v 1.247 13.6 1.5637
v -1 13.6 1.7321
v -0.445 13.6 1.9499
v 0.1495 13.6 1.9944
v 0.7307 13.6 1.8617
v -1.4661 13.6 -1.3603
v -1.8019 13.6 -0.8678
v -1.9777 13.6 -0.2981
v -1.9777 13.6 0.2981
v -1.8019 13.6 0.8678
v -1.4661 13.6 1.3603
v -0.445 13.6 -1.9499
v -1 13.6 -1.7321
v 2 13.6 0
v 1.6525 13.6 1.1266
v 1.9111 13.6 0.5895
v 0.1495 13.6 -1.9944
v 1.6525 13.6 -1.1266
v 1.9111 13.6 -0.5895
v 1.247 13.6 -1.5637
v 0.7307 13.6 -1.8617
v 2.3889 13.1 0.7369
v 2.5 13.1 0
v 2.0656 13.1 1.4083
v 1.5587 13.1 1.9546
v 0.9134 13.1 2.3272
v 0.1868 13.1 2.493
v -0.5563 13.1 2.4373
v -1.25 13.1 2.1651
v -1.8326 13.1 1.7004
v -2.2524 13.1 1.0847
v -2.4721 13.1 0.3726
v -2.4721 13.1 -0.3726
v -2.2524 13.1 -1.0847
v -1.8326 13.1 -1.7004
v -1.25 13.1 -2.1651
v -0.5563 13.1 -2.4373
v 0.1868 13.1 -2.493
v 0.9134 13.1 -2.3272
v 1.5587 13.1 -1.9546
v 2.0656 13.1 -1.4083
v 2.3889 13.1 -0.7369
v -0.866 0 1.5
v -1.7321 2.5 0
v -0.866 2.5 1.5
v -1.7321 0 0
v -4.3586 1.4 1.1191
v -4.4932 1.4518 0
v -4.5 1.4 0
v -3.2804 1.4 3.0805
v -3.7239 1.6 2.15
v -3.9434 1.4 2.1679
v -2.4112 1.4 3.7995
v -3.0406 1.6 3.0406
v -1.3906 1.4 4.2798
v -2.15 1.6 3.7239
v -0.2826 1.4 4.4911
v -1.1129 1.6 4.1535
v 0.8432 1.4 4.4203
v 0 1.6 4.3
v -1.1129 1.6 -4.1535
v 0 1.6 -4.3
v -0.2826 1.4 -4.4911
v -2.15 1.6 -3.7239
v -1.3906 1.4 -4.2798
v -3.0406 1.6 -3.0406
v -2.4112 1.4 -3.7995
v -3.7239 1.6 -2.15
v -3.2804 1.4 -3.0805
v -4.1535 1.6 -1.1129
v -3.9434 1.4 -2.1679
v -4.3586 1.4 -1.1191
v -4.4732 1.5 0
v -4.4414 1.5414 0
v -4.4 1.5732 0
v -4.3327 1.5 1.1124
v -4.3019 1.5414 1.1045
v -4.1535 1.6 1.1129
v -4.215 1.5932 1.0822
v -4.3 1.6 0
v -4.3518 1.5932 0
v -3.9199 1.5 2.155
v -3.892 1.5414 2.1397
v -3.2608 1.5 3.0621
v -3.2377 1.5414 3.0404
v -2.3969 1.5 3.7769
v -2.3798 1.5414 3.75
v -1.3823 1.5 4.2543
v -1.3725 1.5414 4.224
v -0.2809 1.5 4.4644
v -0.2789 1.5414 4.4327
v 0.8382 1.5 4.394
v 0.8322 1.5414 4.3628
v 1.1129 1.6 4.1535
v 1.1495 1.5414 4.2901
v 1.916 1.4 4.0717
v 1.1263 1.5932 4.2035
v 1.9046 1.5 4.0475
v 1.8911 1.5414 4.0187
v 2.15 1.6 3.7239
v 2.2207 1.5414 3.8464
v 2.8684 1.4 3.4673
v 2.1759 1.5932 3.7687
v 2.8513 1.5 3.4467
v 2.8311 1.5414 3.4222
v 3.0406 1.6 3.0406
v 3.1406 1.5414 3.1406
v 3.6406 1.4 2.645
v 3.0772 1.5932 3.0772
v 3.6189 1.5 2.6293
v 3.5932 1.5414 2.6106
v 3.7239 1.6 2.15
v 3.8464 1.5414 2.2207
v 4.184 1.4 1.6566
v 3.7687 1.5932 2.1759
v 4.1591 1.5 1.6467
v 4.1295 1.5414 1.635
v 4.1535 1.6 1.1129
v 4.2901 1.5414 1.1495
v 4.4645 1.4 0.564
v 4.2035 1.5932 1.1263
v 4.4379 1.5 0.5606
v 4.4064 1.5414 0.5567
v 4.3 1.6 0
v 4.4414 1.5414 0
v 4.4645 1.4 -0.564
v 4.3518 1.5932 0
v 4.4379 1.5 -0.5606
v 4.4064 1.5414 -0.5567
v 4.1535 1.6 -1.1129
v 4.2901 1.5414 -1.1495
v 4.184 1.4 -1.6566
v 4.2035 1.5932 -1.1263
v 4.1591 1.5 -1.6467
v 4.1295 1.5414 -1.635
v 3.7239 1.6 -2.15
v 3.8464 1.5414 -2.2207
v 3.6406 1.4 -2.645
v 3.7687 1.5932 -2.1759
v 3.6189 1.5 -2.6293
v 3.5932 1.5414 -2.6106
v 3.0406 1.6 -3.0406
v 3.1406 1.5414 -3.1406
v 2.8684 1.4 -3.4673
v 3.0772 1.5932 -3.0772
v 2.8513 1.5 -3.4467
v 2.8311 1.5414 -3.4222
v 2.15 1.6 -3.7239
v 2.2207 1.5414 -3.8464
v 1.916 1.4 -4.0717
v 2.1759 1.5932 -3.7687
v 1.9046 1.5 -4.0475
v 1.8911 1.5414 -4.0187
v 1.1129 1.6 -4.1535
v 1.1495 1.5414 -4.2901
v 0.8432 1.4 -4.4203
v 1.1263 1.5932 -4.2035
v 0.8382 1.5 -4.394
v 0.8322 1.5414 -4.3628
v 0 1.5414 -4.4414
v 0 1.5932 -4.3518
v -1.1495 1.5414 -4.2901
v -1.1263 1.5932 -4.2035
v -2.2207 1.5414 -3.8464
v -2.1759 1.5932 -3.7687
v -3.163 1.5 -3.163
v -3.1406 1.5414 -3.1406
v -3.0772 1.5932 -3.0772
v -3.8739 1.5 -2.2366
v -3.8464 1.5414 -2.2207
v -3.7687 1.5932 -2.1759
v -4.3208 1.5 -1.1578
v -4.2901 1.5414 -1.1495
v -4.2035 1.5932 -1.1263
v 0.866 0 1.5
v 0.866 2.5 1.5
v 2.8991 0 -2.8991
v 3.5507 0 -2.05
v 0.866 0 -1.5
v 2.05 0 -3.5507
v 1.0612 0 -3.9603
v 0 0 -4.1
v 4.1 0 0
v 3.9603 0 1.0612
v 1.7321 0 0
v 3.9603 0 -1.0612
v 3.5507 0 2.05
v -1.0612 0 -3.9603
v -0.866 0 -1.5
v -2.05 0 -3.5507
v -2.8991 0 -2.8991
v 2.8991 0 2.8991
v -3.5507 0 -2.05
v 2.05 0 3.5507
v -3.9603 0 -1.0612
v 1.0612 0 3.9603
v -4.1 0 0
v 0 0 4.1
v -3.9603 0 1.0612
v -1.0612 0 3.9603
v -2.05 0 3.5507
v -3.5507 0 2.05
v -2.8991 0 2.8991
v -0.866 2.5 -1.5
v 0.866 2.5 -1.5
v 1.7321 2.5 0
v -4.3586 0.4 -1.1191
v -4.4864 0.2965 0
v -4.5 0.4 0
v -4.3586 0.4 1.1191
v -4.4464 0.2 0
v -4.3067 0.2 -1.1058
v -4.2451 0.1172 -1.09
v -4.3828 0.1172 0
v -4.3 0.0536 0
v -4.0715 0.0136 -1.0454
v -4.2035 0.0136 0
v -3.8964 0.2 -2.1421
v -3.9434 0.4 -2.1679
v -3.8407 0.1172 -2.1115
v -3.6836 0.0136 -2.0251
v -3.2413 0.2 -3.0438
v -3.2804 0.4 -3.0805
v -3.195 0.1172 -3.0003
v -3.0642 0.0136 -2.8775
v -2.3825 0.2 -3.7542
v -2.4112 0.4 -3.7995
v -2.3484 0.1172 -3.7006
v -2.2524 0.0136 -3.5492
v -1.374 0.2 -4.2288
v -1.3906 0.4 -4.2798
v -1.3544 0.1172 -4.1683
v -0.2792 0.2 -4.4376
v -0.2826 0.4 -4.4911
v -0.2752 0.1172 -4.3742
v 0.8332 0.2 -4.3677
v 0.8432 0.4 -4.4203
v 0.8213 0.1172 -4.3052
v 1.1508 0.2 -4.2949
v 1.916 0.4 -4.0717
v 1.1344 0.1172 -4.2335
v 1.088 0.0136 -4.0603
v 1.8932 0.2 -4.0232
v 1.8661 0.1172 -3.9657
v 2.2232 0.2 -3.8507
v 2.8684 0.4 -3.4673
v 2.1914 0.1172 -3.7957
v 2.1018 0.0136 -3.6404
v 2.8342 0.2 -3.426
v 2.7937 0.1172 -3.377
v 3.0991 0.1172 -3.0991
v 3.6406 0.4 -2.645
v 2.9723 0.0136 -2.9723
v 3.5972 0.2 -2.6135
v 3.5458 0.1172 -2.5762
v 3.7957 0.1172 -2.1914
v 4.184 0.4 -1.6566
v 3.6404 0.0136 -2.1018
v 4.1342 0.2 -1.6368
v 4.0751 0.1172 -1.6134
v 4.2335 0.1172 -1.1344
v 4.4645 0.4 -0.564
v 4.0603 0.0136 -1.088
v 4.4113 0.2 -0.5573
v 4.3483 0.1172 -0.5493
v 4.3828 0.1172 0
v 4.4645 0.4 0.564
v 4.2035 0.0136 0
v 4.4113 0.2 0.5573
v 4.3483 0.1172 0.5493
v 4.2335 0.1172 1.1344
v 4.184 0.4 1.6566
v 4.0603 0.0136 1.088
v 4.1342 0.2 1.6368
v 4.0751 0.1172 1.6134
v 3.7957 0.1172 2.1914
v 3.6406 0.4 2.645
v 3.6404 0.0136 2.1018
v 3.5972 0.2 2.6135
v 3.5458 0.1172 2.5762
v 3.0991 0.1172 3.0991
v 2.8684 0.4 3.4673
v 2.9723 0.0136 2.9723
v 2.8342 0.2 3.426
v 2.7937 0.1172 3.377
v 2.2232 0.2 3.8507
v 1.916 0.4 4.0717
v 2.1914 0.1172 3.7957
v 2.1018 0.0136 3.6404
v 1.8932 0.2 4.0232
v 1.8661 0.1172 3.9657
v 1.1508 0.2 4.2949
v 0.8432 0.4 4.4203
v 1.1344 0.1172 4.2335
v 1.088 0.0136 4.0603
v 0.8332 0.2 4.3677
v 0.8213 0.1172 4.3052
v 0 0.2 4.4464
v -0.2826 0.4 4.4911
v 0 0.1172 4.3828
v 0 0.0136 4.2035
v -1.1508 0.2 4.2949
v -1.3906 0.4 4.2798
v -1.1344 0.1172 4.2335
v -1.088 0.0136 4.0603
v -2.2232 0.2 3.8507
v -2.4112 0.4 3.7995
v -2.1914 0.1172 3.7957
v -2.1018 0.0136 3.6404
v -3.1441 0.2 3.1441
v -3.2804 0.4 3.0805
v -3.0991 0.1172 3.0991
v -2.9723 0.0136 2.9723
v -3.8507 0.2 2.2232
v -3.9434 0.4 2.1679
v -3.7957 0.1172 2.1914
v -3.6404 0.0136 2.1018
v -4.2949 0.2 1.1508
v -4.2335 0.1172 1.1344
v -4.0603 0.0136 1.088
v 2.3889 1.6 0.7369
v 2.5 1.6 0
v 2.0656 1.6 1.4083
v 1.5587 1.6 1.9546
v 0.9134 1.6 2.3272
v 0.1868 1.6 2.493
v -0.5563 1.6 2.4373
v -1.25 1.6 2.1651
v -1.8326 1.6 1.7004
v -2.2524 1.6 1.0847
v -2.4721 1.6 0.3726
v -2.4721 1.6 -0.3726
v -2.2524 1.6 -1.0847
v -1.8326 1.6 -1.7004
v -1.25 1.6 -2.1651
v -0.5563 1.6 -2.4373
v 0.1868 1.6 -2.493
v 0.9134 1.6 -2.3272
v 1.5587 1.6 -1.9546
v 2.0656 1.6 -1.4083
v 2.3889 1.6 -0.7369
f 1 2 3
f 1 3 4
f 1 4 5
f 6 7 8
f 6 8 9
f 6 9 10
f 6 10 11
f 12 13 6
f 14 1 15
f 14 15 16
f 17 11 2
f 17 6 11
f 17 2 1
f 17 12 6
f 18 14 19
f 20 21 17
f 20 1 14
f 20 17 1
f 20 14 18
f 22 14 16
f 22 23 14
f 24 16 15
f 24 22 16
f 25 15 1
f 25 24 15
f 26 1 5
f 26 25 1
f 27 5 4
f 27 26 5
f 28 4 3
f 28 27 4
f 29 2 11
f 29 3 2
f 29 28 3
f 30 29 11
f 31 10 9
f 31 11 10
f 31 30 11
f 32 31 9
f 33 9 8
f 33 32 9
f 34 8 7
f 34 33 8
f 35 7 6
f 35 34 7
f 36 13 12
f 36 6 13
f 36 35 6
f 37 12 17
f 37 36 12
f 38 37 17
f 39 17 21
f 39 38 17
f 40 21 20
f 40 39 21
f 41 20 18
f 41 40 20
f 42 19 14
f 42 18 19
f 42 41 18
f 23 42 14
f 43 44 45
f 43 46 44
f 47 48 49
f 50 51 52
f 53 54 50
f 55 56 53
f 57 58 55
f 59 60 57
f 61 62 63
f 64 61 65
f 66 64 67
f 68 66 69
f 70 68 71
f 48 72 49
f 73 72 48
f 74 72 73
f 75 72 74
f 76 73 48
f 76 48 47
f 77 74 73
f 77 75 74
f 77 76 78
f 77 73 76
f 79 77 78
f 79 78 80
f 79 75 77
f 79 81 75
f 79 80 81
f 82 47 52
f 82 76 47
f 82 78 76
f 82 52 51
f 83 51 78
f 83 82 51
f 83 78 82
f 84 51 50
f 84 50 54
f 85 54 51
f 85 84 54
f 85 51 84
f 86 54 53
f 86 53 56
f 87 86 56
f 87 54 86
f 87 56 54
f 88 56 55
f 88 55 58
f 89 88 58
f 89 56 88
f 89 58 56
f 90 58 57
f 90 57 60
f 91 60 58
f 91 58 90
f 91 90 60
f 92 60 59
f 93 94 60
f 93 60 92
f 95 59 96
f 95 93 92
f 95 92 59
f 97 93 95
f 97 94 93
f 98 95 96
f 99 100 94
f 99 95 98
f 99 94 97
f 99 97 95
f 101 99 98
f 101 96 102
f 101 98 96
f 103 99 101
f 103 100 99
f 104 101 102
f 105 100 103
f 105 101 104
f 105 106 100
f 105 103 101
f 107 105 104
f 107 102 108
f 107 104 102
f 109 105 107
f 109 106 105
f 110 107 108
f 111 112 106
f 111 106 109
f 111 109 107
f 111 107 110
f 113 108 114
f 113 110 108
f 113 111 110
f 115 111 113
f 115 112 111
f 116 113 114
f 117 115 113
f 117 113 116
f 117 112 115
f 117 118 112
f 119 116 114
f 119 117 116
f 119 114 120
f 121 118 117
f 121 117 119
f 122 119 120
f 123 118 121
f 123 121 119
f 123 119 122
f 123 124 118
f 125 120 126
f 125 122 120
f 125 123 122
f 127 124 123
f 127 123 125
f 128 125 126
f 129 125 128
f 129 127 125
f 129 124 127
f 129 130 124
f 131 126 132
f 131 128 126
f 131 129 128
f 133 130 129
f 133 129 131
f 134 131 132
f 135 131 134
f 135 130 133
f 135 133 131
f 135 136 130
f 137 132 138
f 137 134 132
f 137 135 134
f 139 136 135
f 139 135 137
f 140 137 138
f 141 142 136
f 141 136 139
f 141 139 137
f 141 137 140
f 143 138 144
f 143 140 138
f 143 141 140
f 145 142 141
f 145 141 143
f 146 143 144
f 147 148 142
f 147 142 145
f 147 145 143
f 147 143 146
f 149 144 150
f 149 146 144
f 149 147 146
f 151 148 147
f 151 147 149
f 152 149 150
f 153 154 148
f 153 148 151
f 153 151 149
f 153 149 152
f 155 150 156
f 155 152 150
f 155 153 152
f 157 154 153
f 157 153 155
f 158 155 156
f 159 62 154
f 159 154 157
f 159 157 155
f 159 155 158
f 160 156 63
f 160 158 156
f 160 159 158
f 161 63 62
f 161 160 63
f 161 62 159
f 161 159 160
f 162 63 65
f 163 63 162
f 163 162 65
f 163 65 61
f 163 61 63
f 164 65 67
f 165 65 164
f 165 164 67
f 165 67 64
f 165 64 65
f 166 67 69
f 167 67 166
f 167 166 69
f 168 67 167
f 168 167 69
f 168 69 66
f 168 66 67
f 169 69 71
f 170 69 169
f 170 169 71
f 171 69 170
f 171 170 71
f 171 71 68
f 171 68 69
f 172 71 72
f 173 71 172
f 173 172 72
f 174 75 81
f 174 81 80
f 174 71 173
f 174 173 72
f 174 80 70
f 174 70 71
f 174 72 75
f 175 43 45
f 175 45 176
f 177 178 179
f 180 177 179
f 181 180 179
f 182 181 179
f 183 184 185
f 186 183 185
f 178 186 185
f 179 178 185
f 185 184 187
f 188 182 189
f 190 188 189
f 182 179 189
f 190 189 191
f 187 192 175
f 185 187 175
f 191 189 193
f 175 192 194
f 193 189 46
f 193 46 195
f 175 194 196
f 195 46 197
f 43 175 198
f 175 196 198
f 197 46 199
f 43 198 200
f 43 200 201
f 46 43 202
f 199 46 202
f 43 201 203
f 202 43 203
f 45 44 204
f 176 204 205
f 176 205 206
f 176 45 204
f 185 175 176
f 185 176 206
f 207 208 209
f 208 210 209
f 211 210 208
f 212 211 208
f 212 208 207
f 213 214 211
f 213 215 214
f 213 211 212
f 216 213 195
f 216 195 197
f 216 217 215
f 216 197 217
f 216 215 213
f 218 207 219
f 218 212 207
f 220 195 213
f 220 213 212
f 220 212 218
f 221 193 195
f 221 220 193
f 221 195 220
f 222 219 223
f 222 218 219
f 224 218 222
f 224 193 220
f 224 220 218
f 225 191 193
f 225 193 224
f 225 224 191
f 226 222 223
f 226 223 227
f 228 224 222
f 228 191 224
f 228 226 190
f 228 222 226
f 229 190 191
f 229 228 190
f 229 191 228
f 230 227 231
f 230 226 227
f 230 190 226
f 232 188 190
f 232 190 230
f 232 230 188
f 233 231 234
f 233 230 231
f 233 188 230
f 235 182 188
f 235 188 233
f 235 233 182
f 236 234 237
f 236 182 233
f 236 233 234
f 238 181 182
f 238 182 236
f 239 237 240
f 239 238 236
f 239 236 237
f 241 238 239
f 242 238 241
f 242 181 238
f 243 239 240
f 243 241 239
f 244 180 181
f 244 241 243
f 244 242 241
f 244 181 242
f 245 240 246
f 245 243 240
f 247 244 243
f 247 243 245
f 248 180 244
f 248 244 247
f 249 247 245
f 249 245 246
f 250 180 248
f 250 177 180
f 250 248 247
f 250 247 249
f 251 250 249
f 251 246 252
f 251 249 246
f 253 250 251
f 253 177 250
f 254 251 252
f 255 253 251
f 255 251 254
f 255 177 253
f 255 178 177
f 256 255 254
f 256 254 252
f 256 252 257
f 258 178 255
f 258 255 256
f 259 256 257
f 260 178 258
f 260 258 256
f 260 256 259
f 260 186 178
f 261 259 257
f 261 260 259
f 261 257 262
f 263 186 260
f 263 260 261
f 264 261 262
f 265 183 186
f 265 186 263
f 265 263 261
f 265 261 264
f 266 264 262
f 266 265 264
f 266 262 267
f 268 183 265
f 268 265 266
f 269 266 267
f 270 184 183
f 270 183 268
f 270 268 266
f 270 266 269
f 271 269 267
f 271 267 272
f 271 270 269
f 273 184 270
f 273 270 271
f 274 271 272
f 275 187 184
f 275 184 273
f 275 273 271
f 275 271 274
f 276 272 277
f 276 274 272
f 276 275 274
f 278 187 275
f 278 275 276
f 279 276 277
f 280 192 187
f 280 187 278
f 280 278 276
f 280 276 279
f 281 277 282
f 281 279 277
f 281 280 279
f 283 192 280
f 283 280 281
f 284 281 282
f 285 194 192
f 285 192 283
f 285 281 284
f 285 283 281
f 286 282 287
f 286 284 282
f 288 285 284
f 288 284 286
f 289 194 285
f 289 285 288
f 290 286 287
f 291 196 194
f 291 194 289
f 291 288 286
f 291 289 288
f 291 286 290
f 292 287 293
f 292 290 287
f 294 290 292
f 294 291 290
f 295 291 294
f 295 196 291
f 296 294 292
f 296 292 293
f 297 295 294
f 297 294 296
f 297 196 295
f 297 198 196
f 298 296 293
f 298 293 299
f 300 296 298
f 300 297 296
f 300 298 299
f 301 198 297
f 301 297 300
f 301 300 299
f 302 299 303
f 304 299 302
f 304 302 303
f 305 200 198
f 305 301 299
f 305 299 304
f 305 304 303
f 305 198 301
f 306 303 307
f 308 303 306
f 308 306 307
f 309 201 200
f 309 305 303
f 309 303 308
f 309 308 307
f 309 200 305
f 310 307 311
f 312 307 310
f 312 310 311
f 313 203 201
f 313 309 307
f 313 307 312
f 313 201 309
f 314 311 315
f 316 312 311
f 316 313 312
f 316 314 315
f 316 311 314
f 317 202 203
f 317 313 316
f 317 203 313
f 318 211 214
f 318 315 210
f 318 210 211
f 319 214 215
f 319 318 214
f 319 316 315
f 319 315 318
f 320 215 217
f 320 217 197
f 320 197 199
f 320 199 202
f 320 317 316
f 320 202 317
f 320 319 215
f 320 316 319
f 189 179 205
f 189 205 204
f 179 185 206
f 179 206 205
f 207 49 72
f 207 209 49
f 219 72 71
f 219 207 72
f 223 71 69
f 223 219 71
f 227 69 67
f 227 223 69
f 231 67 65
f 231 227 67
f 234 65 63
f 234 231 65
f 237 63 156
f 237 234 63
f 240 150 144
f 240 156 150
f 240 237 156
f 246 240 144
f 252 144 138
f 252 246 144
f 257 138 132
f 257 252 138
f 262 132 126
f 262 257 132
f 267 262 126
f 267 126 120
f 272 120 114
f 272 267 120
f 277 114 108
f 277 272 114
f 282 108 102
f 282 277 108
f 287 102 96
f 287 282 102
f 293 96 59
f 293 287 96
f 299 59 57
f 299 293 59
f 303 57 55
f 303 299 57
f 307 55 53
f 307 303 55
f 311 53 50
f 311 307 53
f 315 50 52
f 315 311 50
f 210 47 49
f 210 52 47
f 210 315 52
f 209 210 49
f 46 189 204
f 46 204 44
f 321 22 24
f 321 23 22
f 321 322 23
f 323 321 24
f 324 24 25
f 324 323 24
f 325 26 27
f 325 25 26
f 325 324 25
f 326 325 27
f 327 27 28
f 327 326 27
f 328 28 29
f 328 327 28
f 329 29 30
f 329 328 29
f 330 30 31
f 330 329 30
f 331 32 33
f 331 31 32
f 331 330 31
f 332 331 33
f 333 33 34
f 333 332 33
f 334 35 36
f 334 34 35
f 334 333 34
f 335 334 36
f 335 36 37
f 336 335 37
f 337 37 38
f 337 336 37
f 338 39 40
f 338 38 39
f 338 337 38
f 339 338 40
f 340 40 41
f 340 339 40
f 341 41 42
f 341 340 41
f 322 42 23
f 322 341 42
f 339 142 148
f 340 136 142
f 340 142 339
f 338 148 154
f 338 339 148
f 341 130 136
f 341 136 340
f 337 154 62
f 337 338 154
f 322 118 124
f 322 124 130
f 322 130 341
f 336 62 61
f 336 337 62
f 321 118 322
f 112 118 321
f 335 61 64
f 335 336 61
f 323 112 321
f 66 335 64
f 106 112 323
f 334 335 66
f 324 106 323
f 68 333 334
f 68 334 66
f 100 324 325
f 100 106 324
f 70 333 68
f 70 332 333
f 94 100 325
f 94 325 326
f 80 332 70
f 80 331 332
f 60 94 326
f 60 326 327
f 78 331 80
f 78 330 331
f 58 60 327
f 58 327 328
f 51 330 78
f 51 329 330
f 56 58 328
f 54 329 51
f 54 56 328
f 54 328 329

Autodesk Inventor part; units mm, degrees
ref_plane "YZ Plane" through (0, 0, 0) normal (1, 0, 0) x (0, 1, 0)
ref_plane "XZ Plane" through (0, 0, 0) normal (0, 1, 0) x (-1, 0, 0)
ref_plane "XY Plane" through (0, 0, 0) normal (0, 0, 1) x (1, 0, 0)
sketch "Boceto1" plane through (0, 0, 0) normal (0, 1, 0) x (-1, 0, 0)
  circle A0 centre (0, 0) radius 4.5
  dimension "d0" = 9
extrude "Extrusión1" add sketch "Boceto1" along normal blind 1.6
sketch "Boceto2" plane through (0, 1.6, 0) normal (0, 1, 0) x (1, 0, 0)
  circle A0 centre (0, 0) radius 2.5
  dimension "d3" = 5
extrude "Extrusión2" add sketch "Boceto2" along normal blind 12
fillet "Empalme1" radius 0.4 1 edges at (4.5, 0, 0)
fillet "Empalme2" radius 0.2 1 edges at (4.5, 1.6, 0)
sketch "Boceto3" plane through (0, 0, 0) normal (0, -1, 0) x (1, 0, 0)
  line L0 (-1.7321, 0) -> (-0.866, 1.5)
  line L1 (-0.866, 1.5) -> (0.866, 1.5)
  line L2 (0.866, 1.5) -> (1.7321, 0)
  line L3 (1.7321, 0) -> (0.866, -1.5)
  line L4 (0.866, -1.5) -> (-0.866, -1.5)
  line L5 (-0.866, -1.5) -> (-1.7321, 0)
  point P0 (0, 0)
  point P1 (0, 0)
  dimension "d8" = 3
extrude "Extrusión3" cut sketch "Boceto3" against normal blind 2.5
chamfer "Chaflán1" distance 0.5 angle 45 1 edges at (-2.5, 13.6, 0)
thread "Rosca2" size "M5x0.8" class "6g" standard "ANSI Metric M Profile" length 10 offset 2
properties part number "Perno M5x8 cabeza plana" material "Hierro, gris"
